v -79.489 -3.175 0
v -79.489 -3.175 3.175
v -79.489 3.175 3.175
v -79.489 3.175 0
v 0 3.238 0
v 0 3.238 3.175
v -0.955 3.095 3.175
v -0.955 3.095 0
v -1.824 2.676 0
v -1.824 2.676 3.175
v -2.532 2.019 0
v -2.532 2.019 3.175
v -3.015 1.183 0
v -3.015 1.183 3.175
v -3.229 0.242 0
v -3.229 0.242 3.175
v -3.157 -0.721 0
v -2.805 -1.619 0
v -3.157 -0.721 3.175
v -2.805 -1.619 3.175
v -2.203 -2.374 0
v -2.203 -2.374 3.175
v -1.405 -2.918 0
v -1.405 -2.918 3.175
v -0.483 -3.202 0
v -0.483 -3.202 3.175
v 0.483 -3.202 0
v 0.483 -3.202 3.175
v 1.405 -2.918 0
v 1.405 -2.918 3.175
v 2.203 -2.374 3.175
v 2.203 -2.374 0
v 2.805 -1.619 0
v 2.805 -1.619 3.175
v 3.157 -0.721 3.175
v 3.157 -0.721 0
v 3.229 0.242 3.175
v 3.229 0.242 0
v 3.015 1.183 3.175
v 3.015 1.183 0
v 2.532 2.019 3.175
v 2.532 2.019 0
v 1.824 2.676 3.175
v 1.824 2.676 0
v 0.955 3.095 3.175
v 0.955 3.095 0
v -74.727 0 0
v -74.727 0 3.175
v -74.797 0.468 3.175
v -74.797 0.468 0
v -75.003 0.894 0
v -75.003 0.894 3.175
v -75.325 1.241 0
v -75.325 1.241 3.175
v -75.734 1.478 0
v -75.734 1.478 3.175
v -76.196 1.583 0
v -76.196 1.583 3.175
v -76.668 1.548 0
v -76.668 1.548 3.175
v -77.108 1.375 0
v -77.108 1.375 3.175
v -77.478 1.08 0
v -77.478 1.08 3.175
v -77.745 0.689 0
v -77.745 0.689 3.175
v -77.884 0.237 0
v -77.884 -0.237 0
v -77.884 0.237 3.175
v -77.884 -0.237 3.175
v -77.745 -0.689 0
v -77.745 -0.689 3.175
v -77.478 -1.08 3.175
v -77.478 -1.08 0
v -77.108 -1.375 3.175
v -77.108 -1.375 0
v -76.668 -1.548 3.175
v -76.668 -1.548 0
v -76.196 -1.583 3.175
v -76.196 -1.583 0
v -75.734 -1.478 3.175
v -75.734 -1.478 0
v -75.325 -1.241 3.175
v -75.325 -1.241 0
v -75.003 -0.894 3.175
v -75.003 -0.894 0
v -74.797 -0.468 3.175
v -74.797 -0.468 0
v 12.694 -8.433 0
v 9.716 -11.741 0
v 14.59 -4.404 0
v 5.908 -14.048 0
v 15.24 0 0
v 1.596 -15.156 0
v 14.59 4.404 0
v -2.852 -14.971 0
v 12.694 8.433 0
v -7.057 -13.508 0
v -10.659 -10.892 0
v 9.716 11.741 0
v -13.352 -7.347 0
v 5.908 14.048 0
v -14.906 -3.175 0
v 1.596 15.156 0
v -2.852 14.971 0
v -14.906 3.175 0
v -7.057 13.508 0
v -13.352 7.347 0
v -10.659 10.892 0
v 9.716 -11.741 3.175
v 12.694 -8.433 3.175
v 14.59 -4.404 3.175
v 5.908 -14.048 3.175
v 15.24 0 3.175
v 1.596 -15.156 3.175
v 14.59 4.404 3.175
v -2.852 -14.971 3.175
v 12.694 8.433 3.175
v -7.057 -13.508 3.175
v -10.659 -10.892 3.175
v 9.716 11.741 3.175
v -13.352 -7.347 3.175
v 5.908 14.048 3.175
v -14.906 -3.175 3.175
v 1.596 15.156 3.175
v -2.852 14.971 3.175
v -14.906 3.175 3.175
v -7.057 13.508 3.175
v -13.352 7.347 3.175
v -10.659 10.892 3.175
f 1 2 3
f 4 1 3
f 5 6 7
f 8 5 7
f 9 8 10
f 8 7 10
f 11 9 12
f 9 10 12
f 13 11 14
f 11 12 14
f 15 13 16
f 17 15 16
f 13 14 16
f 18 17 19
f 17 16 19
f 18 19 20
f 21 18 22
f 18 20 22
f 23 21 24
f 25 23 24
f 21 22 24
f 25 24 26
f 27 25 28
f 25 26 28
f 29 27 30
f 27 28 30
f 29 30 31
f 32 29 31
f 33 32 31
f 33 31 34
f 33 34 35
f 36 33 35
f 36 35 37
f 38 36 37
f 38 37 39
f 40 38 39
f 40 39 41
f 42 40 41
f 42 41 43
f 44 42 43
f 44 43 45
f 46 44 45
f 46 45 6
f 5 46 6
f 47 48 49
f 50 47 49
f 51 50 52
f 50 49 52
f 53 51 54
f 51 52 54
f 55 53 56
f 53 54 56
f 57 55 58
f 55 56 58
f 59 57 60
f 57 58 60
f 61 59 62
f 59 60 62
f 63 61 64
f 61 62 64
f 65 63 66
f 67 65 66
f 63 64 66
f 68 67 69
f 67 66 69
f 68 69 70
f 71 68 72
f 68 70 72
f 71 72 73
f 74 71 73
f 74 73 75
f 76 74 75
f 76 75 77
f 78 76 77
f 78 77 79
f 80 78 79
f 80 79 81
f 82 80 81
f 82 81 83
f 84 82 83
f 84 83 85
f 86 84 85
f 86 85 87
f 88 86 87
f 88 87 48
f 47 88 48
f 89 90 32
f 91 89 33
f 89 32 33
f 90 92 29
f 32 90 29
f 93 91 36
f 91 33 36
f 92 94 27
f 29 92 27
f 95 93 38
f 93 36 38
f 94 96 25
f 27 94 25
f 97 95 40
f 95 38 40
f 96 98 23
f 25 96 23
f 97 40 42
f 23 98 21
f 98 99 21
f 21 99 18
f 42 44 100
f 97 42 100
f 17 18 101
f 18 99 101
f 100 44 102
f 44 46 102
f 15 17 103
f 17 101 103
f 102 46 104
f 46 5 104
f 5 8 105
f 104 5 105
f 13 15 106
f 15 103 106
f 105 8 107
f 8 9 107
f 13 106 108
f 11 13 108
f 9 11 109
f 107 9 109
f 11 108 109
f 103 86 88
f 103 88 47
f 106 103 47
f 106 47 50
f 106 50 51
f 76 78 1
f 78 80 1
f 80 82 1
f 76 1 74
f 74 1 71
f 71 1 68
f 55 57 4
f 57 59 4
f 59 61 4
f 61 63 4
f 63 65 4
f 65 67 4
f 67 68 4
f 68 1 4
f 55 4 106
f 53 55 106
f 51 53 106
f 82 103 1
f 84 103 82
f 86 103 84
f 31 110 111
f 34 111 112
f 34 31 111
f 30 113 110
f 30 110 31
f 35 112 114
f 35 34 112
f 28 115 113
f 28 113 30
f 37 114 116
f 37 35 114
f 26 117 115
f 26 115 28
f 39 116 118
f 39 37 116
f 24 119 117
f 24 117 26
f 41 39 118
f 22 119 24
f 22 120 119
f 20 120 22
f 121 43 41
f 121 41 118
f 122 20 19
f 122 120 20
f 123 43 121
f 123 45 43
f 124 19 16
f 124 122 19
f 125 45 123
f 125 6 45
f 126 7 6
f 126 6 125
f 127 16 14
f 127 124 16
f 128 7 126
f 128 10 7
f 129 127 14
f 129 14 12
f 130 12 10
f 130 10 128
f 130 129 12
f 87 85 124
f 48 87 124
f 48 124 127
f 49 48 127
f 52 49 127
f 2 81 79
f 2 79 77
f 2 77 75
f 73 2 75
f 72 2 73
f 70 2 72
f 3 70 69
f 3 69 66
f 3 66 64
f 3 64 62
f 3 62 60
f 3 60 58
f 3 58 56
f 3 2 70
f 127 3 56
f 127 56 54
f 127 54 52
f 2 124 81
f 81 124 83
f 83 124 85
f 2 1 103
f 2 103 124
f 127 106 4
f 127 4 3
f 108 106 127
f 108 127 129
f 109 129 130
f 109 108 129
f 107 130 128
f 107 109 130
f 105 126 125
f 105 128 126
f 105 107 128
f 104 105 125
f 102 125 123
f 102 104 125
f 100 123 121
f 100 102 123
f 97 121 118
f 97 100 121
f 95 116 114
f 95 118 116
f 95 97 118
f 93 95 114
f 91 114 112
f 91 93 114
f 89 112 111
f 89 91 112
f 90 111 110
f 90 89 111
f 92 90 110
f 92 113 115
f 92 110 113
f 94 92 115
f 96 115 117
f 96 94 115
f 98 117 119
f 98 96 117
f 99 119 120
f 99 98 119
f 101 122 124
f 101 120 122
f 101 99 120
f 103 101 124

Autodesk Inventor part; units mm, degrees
ref_plane "YZ Plane" through (0, 0, 0) normal (1, 0, 0) x (0, 1, 0)
ref_plane "XZ Plane" through (0, 0, 0) normal (0, 1, 0) x (-1, 0, 0)
sketch "Sketch1" plane through (0, 0, 0) normal (0, 0, 1) x (1, 0, 0)
  circle A0 centre (0, 0) radius 15.24
extrude "Extrusion1" add sketch "Sketch1" along normal blind 3.175
sketch "Sketch2" plane through (0, 0, 3.175) normal (0, 0, 1) x (1, 0, 0)
  circle A0 centre (0, 0) radius 15.24 projected
  line L0 (-15.24, 0) -> (-15.24, 3.175)
  line L1 (-15.24, 0) -> (-15.24, -3.175)
  dimension "d3" = 3.175
  dimension "d4" = 3.175
ref_plane "Work Plane1" through (-15.24, 0, 3.175) normal (1, 0, 0) x (0, 1, 0)
sketch "Sketch3" plane through (-15.24, 0, 3.175) normal (1, 0, 0) x (0, 1, 0)
  line L0 (15.24, 0) -> (-15.24, 0) projected
  line L1 (-15.24, -3.175) -> (15.24, -3.175) projected
  line L2 (0, -3.175) -> (3.175, -3.175)
  line L3 (3.175, -3.175) -> (3.175, 0)
  line L4 (3.175, 0) -> (-3.175, 0)
  line L5 (-3.175, 0) -> (-3.175, -3.175)
  line L6 (-3.175, -3.175) -> (3.175, -3.175)
  dimension "d6" = 6.35
extrude "Extrusion2" add sketch "Sketch3" against normal blind 64.2493
sketch "Sketch4" plane through (-15.24, 0, 3.175) normal (1, 0, 0) x (0, 0, -1)
  line L0 (3.175, -3.175) -> (3.175, 0) projected
  line L1 (0, 3.175) -> (3.175, 3.175)
  line L2 (3.175, 3.175) -> (3.175, -3.175)
  line L3 (3.175, -3.175) -> (0, -3.175)
  line L4 (0, -3.175) -> (0, 3.175)
extrude "Extrusion3" add sketch "Sketch4" along normal blind 12.7
sketch "Sketch6" plane through (0, 0, 0) normal (0, 0, -1) x (-1, 0, 0)
  circle A0 centre (0, 0) radius 3.2385
  dimension "d24" = 6.477
hole "Hole1" at (0, 0, 0) direction (0, 0, -1) diameter 6.477 end through all
hole "Hole2" at (0, 0, 0) direction (0, 0, 1) diameter 6.477 depth 7.9375 tip angle 118
sketch "Sketch7" plane through (0, 0, 3.175) normal (0, 0, 1) x (1, 0, 0)
  line L0 (-79.4893, -3.175) -> (-79.4893, 3.175) projected
  line L1 (-79.4893, 0) -> (-76.3143, 0)
  circle A0 centre (-76.3143, 0) radius 1.5875
  point P0 (0, 0)
  dimension "d39" = 3.175
  dimension "d40" = 3.175
extrude "Extrusion6" cut sketch "Sketch7" against normal blind 25.4
properties part number "ClawLinkage"
